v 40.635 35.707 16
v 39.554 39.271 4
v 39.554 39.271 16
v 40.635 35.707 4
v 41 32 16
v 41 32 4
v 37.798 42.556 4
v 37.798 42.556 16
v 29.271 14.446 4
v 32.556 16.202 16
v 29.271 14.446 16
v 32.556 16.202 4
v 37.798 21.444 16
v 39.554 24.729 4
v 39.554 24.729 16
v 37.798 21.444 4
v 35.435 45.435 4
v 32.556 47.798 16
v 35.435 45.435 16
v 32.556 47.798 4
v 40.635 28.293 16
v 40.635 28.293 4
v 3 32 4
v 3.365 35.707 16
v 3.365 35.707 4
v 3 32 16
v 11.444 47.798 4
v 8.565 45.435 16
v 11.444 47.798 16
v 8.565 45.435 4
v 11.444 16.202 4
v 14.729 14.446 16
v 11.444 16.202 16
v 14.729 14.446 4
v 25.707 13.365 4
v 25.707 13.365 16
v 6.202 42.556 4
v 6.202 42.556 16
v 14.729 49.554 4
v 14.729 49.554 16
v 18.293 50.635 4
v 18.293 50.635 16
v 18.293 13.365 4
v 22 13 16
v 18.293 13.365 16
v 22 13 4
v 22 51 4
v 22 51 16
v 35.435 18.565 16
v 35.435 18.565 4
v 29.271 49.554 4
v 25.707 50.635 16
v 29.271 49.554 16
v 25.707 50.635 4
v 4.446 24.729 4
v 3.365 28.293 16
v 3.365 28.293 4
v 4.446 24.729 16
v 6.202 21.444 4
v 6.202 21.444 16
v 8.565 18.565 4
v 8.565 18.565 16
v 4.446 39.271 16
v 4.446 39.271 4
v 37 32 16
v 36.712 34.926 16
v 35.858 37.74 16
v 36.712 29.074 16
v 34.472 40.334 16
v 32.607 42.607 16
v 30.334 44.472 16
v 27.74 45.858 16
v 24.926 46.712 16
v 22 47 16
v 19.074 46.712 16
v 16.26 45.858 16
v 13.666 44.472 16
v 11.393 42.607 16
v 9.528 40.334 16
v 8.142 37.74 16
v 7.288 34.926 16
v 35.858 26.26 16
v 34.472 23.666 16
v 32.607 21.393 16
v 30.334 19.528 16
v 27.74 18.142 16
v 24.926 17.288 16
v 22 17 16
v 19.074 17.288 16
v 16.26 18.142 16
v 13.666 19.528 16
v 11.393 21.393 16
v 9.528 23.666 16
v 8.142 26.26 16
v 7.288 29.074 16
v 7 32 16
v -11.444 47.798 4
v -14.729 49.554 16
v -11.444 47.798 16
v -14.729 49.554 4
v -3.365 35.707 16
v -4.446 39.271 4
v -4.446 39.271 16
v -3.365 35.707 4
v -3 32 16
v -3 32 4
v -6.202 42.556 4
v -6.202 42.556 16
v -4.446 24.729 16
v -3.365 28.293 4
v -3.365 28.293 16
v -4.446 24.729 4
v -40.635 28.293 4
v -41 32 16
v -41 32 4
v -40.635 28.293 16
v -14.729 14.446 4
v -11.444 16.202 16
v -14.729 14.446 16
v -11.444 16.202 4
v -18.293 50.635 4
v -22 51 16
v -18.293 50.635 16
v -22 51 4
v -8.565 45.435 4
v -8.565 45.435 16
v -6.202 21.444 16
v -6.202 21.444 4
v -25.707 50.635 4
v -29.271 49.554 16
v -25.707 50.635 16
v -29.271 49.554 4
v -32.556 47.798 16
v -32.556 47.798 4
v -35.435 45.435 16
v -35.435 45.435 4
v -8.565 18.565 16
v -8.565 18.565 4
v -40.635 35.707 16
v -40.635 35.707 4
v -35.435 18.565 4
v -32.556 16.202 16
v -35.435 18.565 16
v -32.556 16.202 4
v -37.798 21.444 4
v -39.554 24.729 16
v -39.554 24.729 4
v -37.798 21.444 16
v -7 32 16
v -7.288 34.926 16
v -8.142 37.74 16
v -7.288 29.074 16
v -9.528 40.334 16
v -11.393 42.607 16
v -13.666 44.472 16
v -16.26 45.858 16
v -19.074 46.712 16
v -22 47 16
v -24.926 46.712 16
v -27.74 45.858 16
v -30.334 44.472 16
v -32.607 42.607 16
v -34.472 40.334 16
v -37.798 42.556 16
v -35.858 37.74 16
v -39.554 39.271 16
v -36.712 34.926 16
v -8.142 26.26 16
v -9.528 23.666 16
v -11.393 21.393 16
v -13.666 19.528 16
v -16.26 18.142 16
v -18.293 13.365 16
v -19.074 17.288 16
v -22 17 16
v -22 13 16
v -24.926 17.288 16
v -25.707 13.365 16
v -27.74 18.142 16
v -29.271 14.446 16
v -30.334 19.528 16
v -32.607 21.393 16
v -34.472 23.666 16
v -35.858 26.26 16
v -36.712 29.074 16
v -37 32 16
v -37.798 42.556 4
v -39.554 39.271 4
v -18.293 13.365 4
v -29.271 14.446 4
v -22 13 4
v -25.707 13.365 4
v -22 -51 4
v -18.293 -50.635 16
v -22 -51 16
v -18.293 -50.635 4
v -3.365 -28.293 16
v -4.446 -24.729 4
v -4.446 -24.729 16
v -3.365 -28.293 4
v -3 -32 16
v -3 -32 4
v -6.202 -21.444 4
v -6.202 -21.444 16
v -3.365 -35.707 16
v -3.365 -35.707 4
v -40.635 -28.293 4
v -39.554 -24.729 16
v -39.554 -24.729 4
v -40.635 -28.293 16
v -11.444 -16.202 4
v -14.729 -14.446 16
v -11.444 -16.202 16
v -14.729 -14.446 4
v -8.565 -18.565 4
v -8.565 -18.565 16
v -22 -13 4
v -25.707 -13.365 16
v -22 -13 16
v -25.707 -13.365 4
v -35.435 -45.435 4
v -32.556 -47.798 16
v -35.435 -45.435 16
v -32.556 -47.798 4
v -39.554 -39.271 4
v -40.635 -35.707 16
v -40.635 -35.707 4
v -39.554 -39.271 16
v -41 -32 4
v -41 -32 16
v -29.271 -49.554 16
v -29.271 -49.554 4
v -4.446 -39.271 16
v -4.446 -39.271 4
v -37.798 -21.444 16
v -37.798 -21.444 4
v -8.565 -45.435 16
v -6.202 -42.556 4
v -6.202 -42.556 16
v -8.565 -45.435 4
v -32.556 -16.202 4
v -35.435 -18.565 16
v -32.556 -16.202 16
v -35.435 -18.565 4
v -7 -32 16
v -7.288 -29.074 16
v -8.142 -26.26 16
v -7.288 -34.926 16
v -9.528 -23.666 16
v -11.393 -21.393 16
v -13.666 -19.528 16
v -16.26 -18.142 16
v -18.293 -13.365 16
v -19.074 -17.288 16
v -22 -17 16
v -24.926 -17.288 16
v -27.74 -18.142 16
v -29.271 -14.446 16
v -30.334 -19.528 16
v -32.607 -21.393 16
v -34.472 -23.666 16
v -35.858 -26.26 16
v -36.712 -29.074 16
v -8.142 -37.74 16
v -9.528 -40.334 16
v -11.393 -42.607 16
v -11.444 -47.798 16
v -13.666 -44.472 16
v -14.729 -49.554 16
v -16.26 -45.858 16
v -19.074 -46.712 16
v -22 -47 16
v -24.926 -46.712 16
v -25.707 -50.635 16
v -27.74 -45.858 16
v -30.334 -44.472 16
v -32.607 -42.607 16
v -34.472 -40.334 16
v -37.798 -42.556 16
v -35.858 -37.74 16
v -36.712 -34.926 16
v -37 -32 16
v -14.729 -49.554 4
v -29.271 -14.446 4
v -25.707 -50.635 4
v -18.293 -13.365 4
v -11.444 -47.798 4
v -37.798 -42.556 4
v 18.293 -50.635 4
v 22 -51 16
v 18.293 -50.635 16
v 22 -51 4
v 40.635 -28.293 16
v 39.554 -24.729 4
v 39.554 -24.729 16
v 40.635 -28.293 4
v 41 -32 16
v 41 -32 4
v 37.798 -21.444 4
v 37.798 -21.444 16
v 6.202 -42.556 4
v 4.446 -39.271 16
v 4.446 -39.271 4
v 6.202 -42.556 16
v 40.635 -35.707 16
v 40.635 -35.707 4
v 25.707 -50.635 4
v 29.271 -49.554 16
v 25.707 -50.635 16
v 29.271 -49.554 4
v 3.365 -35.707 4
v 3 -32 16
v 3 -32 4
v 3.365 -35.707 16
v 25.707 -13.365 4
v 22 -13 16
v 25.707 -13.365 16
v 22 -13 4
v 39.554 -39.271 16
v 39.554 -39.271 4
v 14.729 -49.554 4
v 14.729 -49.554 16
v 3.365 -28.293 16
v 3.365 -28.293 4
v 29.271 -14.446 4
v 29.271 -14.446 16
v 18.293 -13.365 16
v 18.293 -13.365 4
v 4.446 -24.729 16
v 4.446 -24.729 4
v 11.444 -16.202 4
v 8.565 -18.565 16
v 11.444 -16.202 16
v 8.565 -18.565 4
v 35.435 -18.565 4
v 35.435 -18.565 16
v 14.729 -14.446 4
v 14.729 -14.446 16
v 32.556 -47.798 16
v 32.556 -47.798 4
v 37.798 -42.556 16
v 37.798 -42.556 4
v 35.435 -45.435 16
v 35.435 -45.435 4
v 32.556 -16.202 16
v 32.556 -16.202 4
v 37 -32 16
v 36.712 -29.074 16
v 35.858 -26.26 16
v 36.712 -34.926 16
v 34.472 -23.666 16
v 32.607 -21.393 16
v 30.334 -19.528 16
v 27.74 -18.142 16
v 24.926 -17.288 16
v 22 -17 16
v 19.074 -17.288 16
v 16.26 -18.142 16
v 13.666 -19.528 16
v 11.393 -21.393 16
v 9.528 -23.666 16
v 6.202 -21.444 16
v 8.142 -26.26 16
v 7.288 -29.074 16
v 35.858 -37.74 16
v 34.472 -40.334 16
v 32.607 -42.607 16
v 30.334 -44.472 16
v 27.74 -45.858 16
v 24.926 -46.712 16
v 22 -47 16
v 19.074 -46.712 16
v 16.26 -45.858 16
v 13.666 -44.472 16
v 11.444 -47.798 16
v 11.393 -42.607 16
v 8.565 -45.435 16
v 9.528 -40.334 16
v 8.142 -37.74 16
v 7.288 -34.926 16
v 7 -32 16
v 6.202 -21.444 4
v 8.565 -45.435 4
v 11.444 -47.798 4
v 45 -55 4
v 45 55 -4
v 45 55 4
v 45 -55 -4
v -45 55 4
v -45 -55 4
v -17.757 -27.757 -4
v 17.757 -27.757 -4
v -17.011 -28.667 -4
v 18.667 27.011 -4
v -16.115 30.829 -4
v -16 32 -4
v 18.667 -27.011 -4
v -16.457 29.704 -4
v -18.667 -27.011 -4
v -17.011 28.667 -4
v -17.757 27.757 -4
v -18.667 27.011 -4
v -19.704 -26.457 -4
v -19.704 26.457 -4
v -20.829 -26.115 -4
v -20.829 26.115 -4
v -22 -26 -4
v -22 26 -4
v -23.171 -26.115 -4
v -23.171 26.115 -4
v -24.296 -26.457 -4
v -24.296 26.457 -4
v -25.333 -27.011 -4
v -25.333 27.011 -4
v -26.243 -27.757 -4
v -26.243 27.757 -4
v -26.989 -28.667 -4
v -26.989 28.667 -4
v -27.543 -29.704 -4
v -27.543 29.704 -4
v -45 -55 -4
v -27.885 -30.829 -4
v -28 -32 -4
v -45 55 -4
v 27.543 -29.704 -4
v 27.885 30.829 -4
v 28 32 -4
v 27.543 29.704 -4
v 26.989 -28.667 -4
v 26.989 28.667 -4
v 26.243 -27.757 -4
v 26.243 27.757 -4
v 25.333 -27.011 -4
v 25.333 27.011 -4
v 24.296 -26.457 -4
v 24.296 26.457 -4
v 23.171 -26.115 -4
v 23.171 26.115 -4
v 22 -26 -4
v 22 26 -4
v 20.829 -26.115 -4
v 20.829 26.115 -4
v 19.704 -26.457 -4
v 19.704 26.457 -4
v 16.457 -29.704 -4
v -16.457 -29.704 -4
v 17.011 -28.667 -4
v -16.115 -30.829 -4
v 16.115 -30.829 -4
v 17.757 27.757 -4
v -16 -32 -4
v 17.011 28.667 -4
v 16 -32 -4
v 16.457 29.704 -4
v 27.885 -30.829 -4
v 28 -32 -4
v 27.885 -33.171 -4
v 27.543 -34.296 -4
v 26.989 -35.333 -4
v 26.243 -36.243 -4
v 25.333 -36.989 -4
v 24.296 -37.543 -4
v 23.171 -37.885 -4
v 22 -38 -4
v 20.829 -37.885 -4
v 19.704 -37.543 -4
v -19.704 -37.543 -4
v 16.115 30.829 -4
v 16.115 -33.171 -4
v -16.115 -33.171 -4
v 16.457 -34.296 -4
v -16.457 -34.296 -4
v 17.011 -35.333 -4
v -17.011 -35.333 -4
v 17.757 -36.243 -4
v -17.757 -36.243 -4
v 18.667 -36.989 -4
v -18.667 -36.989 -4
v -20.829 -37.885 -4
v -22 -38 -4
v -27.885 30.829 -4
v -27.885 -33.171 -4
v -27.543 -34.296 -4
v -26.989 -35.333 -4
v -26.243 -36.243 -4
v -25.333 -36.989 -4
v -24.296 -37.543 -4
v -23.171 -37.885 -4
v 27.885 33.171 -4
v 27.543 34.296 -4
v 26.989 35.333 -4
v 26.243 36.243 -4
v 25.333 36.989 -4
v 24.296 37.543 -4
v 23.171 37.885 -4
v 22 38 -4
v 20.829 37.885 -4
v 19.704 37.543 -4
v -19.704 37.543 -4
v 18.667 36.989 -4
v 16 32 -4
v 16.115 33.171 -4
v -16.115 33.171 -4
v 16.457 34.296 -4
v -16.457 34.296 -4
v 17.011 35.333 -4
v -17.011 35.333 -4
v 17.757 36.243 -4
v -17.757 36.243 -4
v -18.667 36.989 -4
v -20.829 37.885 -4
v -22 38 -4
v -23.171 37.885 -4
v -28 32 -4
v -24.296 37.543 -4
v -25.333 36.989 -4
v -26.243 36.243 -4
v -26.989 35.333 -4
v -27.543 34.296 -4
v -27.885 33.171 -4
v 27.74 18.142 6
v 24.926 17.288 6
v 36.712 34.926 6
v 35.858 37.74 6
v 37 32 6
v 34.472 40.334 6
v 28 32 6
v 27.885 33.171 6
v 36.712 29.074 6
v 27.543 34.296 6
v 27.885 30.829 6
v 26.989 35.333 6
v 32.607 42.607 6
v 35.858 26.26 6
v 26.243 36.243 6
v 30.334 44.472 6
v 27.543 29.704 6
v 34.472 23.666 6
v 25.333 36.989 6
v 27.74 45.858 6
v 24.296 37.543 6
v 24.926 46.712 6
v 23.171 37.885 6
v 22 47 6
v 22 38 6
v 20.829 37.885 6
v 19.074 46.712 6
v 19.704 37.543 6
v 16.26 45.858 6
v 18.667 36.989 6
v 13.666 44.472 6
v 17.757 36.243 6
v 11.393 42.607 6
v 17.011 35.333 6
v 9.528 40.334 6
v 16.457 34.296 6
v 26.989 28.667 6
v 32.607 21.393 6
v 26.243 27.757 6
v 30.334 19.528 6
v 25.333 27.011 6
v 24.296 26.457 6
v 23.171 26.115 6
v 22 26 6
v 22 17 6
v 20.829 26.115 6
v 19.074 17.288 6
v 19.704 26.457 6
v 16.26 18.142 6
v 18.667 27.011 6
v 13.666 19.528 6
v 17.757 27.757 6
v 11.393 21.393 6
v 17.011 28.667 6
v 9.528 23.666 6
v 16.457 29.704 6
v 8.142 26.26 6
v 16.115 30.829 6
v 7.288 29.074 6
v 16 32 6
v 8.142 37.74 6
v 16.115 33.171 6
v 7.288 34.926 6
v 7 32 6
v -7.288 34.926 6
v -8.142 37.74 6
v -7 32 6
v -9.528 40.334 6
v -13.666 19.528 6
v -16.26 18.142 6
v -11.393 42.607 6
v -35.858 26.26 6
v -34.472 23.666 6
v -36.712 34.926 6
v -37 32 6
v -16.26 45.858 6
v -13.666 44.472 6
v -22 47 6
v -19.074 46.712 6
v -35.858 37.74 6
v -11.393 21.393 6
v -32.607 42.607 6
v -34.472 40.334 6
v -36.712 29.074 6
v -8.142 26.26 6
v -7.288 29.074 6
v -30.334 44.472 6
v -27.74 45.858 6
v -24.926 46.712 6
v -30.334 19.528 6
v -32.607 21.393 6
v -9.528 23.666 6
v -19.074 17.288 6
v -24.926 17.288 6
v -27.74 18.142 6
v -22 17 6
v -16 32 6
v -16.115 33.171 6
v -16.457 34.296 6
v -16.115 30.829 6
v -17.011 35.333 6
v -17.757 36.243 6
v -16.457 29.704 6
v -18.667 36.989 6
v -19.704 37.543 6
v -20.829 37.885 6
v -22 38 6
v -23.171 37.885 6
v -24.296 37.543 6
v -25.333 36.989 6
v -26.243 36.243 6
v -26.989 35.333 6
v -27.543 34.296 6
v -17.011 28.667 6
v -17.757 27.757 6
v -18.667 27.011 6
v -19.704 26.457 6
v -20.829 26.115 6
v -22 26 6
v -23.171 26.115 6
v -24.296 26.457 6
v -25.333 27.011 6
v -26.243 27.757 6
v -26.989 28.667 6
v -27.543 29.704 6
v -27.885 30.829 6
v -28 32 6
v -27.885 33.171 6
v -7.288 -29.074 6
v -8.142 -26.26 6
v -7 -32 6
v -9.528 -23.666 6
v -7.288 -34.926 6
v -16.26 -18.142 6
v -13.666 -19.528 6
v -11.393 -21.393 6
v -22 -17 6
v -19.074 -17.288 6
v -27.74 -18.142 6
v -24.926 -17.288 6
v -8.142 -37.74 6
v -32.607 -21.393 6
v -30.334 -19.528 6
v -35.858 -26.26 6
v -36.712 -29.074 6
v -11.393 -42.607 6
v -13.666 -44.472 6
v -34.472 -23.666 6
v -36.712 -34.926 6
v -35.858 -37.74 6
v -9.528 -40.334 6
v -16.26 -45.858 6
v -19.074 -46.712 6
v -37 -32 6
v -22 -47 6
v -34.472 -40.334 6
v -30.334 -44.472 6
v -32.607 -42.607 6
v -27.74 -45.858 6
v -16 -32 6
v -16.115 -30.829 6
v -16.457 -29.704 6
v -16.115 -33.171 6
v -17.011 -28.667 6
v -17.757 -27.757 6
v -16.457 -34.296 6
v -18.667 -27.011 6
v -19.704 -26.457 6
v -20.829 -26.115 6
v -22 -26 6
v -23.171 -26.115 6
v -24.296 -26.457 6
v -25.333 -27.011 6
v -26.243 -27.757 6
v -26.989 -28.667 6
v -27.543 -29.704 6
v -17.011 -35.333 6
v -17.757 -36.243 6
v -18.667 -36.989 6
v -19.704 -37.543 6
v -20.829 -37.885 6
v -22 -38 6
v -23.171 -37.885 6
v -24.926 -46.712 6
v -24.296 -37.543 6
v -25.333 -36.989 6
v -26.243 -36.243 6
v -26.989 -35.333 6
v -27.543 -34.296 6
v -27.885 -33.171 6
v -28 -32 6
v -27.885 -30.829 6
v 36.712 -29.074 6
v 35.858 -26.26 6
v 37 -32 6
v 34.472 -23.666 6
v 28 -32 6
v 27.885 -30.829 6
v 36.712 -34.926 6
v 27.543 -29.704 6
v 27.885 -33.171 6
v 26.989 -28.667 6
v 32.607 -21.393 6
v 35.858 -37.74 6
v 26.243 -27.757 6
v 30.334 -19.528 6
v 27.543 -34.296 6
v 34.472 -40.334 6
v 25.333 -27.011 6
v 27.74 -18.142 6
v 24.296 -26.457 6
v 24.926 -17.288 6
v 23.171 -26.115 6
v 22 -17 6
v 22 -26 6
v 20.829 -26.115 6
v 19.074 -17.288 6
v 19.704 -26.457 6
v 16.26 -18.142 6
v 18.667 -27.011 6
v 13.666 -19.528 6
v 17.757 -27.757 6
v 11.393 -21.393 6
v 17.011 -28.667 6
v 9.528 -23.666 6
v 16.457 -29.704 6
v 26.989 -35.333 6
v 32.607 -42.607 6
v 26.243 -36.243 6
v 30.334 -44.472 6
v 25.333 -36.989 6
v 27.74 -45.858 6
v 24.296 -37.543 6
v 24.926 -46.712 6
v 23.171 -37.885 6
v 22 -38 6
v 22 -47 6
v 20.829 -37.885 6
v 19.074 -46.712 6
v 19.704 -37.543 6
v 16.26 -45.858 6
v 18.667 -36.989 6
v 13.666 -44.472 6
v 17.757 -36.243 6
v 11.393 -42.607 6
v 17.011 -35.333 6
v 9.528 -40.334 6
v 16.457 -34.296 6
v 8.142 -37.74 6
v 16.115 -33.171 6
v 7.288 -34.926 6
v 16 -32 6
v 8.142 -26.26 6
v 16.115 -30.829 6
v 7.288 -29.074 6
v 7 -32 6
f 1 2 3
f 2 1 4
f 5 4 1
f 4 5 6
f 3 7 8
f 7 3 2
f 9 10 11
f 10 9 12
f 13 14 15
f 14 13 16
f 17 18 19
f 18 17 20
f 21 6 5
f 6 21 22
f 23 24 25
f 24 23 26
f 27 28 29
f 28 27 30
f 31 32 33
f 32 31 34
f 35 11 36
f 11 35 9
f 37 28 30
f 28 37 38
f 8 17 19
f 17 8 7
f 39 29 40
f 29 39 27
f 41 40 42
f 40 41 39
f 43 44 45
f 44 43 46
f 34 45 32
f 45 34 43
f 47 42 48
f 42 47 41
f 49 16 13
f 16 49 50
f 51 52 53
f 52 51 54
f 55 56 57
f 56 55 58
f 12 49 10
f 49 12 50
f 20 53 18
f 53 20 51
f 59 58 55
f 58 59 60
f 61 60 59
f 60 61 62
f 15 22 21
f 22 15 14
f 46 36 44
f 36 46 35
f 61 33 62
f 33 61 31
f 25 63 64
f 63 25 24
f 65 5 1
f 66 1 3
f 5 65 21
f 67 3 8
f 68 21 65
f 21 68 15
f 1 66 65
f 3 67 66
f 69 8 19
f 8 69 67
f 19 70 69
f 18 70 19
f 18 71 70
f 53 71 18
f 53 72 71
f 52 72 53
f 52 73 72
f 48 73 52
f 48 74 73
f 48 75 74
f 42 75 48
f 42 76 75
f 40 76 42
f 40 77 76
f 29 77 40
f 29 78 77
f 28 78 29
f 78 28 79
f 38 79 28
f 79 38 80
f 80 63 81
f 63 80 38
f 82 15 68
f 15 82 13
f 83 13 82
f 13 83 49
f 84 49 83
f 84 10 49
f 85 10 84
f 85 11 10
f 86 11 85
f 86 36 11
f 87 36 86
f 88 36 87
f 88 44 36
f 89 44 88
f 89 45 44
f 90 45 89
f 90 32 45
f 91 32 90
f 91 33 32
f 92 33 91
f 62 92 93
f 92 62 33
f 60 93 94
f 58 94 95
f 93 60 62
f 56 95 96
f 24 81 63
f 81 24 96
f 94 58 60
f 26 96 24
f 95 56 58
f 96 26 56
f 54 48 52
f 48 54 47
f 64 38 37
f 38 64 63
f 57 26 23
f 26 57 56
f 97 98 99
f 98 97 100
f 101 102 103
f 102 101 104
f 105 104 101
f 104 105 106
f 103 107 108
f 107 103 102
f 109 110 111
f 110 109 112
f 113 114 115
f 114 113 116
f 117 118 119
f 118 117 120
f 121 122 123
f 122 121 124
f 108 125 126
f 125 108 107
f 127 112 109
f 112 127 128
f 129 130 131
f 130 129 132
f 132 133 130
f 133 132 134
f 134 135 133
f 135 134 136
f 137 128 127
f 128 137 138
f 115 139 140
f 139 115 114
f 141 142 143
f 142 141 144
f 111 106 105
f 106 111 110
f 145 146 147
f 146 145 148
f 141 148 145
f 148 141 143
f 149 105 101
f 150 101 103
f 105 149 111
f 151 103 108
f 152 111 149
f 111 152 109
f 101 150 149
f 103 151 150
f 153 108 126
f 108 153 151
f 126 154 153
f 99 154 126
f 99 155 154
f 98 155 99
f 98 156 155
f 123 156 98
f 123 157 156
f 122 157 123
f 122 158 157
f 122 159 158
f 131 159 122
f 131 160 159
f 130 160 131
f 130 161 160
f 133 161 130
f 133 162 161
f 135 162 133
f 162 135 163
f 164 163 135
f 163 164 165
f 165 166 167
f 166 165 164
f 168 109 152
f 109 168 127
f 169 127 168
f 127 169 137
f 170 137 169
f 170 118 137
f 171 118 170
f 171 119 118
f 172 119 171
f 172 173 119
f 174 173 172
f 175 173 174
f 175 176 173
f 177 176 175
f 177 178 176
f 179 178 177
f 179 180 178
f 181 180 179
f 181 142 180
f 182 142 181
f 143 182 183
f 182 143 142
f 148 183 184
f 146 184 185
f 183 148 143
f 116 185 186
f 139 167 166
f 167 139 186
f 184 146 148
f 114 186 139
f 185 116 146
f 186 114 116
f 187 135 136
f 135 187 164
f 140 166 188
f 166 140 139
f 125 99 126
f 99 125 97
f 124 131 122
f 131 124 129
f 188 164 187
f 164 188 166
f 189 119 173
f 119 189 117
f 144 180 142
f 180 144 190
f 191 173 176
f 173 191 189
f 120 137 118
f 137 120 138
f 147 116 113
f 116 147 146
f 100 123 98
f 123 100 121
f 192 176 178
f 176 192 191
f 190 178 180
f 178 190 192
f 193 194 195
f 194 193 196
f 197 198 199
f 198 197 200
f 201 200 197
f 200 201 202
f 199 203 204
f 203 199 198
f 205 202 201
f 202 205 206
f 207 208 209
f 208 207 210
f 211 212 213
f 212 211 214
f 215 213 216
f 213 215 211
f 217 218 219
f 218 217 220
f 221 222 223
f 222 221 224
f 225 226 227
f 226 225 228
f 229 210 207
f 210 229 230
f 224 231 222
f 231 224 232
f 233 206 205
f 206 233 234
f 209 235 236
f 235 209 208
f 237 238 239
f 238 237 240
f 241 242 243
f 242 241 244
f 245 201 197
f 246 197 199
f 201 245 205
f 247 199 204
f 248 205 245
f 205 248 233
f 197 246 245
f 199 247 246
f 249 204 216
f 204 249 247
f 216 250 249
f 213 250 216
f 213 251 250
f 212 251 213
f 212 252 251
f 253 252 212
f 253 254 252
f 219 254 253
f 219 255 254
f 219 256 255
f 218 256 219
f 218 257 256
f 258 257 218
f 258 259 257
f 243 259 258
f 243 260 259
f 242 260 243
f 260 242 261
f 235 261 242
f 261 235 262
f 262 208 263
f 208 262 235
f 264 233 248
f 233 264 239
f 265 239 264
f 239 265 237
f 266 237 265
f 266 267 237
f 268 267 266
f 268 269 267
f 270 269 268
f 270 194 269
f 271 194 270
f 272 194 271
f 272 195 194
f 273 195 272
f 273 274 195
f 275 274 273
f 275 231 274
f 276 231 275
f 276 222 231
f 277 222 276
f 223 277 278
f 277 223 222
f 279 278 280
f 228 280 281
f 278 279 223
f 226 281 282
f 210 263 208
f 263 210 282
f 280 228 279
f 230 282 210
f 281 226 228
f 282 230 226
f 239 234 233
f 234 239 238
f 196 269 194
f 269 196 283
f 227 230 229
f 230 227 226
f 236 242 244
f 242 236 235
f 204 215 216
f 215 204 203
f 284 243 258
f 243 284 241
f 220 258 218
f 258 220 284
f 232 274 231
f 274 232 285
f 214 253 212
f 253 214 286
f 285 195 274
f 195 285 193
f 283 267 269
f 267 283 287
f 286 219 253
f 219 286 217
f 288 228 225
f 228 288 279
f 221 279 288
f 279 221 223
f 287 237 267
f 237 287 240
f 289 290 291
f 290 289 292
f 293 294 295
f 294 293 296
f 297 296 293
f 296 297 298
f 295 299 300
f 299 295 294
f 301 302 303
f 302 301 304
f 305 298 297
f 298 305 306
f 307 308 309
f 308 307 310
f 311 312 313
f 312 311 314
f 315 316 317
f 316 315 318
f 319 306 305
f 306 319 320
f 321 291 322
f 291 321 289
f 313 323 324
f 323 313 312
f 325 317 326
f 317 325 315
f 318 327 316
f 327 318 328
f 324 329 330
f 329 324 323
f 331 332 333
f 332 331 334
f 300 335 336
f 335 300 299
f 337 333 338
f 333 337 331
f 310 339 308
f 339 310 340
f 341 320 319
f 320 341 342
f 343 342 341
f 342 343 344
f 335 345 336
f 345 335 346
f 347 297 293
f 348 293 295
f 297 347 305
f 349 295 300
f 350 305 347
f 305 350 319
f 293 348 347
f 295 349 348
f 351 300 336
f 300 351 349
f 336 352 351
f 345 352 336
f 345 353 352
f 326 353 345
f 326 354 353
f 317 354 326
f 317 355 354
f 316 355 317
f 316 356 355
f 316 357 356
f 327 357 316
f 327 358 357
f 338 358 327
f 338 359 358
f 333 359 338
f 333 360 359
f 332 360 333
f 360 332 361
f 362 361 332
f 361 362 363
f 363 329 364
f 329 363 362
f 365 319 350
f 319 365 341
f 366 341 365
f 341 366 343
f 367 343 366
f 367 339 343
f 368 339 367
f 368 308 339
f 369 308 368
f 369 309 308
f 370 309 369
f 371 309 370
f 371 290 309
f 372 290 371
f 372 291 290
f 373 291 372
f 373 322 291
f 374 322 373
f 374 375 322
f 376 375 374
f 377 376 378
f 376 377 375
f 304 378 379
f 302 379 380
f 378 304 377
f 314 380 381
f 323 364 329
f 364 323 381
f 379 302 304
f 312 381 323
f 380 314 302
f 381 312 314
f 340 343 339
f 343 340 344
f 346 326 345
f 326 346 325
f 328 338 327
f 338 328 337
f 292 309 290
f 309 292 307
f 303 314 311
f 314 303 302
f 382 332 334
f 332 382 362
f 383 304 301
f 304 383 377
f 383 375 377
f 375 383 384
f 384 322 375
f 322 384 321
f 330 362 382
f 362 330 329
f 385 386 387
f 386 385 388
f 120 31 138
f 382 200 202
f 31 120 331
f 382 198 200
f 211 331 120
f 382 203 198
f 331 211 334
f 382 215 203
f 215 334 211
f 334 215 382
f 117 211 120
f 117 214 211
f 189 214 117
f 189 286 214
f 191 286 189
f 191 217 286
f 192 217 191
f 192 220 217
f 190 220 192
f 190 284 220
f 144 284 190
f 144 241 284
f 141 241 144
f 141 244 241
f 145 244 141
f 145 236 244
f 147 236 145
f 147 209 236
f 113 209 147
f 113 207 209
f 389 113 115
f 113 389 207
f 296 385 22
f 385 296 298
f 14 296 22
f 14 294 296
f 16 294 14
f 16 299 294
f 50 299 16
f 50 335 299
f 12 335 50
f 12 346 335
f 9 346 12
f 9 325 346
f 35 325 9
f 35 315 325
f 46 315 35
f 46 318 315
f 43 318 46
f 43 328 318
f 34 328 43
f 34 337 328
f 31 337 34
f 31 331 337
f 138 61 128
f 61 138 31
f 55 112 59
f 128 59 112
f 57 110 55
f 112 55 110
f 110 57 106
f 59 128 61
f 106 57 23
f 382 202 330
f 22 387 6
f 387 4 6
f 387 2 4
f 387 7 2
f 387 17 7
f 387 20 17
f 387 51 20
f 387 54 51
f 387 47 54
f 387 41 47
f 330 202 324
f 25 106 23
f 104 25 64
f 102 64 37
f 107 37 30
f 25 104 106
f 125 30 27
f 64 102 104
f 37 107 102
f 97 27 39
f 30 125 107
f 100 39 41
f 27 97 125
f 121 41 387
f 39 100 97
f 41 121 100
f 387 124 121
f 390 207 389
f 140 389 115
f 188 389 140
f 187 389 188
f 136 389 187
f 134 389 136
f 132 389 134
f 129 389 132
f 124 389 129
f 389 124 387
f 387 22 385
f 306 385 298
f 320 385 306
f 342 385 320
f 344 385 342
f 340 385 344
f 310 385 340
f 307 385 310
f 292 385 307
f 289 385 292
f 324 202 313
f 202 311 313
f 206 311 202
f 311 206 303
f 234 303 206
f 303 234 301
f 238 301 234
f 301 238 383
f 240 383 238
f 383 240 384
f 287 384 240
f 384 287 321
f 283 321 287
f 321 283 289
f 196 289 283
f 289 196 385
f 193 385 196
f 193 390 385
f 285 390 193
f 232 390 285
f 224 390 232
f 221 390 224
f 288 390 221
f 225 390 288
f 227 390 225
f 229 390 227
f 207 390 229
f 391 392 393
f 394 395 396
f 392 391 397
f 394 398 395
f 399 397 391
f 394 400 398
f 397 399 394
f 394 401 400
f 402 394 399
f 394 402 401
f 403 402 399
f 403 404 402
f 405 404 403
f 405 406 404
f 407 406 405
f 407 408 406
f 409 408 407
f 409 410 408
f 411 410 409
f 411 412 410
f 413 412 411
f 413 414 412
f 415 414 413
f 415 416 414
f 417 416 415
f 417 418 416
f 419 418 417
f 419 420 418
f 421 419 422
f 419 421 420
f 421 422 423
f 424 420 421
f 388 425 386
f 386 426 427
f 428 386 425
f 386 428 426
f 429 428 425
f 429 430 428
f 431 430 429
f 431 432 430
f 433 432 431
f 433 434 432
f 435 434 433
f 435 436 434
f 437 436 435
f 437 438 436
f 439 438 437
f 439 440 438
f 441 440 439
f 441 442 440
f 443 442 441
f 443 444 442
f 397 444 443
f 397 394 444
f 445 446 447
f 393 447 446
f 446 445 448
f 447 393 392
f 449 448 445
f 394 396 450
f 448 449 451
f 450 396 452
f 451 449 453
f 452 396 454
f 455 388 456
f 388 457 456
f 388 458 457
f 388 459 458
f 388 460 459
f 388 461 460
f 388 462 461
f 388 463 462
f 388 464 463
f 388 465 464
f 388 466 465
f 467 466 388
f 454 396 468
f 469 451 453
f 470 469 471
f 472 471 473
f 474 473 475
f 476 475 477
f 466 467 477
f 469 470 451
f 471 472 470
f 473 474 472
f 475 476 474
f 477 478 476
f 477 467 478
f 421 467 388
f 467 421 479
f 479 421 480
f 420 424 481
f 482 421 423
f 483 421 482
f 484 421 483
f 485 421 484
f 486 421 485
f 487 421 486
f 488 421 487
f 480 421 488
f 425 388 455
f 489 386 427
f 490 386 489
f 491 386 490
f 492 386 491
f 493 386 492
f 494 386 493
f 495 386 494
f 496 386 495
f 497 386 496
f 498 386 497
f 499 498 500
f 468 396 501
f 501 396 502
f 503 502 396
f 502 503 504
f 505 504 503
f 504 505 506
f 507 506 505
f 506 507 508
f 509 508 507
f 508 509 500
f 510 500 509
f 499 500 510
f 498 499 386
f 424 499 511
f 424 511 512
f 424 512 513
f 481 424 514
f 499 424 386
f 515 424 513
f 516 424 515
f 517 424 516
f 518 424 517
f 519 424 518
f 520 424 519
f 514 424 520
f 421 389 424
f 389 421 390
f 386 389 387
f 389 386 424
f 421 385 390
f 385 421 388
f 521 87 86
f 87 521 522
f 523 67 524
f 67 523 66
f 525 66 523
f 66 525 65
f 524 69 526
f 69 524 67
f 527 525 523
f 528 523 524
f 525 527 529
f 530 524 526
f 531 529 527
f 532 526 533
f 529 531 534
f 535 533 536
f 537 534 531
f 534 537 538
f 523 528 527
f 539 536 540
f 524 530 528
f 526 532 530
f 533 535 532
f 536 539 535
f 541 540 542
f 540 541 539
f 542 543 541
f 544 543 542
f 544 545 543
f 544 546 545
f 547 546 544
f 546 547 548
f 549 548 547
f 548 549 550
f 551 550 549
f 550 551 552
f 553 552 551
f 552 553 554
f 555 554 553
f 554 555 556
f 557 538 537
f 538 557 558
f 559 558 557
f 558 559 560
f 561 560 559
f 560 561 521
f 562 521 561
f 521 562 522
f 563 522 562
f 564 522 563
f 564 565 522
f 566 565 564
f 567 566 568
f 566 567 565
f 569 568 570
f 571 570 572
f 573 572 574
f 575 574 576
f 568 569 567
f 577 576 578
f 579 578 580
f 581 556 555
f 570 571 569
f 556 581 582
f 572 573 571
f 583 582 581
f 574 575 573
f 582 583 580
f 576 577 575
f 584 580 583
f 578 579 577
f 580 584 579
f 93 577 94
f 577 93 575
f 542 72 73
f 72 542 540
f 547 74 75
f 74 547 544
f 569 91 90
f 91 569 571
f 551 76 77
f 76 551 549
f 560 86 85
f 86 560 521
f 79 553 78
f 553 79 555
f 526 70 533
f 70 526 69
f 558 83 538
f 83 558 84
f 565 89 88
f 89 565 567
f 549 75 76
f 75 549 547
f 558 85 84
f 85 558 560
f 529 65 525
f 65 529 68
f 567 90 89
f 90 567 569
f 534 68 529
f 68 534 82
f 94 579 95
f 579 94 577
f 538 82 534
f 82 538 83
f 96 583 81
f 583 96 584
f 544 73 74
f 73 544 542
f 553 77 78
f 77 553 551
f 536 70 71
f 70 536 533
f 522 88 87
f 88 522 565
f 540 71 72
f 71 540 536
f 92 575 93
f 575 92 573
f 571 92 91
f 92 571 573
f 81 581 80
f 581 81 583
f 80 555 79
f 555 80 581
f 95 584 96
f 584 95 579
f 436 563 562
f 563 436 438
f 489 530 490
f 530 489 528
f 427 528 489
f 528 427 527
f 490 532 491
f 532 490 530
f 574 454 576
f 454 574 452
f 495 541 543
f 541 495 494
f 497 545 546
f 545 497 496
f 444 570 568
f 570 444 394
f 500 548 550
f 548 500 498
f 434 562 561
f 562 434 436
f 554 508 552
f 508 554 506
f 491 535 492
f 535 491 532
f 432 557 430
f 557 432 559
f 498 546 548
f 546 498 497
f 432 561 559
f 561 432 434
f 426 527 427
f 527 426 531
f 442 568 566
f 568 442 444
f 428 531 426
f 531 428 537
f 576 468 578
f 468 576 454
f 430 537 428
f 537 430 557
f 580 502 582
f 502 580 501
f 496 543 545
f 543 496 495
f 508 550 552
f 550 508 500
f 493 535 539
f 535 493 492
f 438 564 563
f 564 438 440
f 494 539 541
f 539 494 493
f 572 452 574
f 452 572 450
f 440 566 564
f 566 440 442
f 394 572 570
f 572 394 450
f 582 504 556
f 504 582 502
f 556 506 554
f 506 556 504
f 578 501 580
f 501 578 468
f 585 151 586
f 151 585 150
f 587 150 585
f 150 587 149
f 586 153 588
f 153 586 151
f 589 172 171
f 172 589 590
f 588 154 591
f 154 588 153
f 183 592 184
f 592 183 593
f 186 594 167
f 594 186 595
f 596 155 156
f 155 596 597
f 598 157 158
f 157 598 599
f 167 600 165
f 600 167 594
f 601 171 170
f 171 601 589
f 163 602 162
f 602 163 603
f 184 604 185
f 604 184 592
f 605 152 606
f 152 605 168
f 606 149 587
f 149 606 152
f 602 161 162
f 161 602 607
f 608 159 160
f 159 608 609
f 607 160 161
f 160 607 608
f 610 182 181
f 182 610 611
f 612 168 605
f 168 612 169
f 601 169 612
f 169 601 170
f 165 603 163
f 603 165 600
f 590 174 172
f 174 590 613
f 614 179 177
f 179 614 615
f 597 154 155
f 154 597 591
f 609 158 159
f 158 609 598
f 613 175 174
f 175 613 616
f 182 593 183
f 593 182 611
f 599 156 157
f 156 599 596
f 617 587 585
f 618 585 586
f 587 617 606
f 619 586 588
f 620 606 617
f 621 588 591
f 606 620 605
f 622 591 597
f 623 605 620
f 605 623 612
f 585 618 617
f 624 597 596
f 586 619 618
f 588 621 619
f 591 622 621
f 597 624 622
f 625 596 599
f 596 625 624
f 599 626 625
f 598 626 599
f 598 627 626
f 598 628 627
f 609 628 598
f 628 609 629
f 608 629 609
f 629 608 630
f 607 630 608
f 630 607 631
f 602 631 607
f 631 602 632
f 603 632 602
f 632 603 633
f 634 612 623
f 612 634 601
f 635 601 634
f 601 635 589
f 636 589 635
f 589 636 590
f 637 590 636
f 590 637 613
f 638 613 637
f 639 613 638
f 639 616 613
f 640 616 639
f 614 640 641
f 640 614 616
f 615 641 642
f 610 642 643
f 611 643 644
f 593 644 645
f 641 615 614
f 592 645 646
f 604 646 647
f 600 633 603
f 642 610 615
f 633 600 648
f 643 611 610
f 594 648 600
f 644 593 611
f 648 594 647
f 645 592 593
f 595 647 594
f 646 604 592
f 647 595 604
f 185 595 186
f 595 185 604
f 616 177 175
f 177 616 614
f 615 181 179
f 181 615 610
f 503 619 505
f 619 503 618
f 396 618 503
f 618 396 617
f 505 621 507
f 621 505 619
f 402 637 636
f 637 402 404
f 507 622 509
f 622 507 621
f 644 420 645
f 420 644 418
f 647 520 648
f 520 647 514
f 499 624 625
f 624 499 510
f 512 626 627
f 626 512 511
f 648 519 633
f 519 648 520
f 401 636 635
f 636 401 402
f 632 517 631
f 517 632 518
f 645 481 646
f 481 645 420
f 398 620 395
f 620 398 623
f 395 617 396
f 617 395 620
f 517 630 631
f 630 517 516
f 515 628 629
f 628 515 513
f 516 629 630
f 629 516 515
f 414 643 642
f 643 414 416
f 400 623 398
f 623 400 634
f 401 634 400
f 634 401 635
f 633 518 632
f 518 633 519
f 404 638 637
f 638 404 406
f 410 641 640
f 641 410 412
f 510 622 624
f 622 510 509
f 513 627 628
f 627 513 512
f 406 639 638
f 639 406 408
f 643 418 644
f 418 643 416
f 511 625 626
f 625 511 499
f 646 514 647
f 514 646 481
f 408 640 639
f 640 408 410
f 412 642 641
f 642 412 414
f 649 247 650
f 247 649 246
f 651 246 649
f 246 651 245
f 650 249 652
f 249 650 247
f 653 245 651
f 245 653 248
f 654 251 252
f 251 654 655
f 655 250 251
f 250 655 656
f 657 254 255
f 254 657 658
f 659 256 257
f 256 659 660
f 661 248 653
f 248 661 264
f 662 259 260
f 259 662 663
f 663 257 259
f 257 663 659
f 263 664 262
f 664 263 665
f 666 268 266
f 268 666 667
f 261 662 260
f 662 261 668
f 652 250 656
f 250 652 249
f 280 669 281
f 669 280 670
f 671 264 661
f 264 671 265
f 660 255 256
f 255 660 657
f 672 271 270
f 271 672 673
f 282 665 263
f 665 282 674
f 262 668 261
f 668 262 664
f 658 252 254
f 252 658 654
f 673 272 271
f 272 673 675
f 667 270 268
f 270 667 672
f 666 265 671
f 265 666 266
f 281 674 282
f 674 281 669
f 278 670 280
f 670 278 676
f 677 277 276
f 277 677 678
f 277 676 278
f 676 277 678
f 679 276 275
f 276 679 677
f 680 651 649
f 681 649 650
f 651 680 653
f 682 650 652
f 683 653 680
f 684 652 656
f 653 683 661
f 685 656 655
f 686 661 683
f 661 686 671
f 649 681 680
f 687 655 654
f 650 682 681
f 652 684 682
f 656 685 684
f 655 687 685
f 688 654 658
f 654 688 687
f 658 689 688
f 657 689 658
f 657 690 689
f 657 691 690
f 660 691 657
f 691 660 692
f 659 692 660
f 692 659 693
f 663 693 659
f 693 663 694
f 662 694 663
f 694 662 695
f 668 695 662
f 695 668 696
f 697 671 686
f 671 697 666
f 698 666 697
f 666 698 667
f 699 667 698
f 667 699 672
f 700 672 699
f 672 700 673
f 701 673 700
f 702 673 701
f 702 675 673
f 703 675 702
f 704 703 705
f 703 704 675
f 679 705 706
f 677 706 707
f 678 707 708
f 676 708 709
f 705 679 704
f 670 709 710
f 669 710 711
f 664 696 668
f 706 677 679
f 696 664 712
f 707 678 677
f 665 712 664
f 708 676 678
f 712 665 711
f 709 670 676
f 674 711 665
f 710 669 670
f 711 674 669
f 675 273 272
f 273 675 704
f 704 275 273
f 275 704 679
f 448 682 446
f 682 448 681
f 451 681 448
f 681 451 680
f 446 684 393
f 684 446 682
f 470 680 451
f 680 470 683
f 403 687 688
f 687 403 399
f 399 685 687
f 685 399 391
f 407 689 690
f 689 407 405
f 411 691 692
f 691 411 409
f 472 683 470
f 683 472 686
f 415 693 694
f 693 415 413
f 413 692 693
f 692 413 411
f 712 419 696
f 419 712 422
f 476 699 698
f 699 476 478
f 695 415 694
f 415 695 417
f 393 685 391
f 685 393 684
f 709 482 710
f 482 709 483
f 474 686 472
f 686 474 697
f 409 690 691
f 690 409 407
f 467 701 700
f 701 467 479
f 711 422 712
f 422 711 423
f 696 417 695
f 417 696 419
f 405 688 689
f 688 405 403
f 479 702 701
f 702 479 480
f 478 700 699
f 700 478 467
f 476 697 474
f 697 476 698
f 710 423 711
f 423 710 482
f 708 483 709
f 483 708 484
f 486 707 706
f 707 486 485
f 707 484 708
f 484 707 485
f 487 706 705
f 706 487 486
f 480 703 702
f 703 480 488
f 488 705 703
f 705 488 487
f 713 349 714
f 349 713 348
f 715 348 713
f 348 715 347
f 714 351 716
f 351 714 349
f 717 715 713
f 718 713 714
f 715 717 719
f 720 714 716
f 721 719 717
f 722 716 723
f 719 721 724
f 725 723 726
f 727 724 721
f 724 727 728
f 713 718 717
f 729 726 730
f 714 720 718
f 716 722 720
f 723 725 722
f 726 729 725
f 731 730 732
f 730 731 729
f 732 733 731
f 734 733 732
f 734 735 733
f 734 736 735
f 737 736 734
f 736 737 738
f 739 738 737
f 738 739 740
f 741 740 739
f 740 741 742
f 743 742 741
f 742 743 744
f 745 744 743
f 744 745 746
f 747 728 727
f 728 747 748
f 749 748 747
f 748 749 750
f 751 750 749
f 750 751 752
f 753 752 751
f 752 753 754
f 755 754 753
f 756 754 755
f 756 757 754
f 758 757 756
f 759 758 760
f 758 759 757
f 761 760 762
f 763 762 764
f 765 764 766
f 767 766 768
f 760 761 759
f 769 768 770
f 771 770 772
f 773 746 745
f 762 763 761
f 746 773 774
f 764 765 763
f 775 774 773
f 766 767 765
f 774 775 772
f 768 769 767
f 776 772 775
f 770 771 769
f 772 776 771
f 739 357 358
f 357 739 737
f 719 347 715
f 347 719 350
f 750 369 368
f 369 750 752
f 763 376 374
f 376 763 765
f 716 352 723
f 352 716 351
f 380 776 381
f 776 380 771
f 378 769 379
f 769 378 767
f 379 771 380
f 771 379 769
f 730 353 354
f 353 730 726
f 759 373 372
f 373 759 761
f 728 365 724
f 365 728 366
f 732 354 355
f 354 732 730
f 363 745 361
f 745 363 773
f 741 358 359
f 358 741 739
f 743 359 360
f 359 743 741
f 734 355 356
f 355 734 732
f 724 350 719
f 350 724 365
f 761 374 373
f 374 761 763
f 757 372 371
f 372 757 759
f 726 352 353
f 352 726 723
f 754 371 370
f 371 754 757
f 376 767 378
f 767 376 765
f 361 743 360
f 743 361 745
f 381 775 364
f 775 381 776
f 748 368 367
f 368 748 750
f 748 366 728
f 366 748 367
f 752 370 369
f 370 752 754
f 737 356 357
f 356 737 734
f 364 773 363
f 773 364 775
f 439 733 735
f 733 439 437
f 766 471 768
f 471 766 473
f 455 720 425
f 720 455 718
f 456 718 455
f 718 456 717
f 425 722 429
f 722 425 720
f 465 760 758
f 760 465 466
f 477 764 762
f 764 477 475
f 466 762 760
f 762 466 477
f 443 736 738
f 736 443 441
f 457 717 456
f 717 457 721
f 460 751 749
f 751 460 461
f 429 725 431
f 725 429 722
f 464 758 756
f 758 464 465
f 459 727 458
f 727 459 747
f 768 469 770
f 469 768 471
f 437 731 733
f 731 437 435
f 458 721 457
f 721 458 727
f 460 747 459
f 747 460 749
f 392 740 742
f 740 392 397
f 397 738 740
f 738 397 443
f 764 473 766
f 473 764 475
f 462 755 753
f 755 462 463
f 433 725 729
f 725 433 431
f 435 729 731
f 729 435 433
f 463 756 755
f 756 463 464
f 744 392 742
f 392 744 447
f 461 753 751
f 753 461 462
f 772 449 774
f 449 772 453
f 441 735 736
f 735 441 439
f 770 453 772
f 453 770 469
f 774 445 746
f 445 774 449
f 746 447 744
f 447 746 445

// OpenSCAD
$fn = 32;

// ----------------------------------------------------------------------
// Socket pad plate
// bosses with counterbored sockets for the screws
// ----------------------------------------------------------------------

// --- parameters (mm) ---
base_t = 8;            // base plate thickness
boss_h = 12;           // boss height above the base plate
boss_d = 38;           // boss diameter
socket_d = 30;         // socket diameter
socket_depth = 10;     // socket depth from the boss face
bolt_d = 12;           // screw clearance hole through the socket floor
plate = [90, 110, 8];  // overall size (x, y, z)
edge = 23;             // boss centre offset from the plate edge
pads = 4;              // boss count, one per corner

// --- derived feature positions (mm) ---
height = base_t + boss_h;        // = 20   overall height of the part
corner_x = plate[0] / 2 - edge;  // = 22   boss centre X
corner_y = plate[1] / 2 - edge;  // = 32   boss centre Y
feature_centers = [
  [corner_x, corner_y],
  [-corner_x, corner_y],
  [-corner_x, -corner_y],
  [corner_x, -corner_y]
];   // boss centres: sockets, holes and the pads themselves are placed from here

// base plate, bosses on feature_centers, socket + through hole in each
difference() {
  union() {
    cube(plate, center = true);
    for (centre = feature_centers)
      translate([centre[0], centre[1], plate[2] / 2 - 1])
        cylinder(d = boss_d, h = boss_h + 1);
  }
  for (centre = feature_centers) {
    translate([centre[0], centre[1], plate[2] / 2 + boss_h - socket_depth])
      cylinder(d = socket_d, h = socket_depth + 1);
    translate([centre[0], centre[1], -height])
      cylinder(d = bolt_d, h = 2 * height + 2);  // through the socket floor
  }
}
